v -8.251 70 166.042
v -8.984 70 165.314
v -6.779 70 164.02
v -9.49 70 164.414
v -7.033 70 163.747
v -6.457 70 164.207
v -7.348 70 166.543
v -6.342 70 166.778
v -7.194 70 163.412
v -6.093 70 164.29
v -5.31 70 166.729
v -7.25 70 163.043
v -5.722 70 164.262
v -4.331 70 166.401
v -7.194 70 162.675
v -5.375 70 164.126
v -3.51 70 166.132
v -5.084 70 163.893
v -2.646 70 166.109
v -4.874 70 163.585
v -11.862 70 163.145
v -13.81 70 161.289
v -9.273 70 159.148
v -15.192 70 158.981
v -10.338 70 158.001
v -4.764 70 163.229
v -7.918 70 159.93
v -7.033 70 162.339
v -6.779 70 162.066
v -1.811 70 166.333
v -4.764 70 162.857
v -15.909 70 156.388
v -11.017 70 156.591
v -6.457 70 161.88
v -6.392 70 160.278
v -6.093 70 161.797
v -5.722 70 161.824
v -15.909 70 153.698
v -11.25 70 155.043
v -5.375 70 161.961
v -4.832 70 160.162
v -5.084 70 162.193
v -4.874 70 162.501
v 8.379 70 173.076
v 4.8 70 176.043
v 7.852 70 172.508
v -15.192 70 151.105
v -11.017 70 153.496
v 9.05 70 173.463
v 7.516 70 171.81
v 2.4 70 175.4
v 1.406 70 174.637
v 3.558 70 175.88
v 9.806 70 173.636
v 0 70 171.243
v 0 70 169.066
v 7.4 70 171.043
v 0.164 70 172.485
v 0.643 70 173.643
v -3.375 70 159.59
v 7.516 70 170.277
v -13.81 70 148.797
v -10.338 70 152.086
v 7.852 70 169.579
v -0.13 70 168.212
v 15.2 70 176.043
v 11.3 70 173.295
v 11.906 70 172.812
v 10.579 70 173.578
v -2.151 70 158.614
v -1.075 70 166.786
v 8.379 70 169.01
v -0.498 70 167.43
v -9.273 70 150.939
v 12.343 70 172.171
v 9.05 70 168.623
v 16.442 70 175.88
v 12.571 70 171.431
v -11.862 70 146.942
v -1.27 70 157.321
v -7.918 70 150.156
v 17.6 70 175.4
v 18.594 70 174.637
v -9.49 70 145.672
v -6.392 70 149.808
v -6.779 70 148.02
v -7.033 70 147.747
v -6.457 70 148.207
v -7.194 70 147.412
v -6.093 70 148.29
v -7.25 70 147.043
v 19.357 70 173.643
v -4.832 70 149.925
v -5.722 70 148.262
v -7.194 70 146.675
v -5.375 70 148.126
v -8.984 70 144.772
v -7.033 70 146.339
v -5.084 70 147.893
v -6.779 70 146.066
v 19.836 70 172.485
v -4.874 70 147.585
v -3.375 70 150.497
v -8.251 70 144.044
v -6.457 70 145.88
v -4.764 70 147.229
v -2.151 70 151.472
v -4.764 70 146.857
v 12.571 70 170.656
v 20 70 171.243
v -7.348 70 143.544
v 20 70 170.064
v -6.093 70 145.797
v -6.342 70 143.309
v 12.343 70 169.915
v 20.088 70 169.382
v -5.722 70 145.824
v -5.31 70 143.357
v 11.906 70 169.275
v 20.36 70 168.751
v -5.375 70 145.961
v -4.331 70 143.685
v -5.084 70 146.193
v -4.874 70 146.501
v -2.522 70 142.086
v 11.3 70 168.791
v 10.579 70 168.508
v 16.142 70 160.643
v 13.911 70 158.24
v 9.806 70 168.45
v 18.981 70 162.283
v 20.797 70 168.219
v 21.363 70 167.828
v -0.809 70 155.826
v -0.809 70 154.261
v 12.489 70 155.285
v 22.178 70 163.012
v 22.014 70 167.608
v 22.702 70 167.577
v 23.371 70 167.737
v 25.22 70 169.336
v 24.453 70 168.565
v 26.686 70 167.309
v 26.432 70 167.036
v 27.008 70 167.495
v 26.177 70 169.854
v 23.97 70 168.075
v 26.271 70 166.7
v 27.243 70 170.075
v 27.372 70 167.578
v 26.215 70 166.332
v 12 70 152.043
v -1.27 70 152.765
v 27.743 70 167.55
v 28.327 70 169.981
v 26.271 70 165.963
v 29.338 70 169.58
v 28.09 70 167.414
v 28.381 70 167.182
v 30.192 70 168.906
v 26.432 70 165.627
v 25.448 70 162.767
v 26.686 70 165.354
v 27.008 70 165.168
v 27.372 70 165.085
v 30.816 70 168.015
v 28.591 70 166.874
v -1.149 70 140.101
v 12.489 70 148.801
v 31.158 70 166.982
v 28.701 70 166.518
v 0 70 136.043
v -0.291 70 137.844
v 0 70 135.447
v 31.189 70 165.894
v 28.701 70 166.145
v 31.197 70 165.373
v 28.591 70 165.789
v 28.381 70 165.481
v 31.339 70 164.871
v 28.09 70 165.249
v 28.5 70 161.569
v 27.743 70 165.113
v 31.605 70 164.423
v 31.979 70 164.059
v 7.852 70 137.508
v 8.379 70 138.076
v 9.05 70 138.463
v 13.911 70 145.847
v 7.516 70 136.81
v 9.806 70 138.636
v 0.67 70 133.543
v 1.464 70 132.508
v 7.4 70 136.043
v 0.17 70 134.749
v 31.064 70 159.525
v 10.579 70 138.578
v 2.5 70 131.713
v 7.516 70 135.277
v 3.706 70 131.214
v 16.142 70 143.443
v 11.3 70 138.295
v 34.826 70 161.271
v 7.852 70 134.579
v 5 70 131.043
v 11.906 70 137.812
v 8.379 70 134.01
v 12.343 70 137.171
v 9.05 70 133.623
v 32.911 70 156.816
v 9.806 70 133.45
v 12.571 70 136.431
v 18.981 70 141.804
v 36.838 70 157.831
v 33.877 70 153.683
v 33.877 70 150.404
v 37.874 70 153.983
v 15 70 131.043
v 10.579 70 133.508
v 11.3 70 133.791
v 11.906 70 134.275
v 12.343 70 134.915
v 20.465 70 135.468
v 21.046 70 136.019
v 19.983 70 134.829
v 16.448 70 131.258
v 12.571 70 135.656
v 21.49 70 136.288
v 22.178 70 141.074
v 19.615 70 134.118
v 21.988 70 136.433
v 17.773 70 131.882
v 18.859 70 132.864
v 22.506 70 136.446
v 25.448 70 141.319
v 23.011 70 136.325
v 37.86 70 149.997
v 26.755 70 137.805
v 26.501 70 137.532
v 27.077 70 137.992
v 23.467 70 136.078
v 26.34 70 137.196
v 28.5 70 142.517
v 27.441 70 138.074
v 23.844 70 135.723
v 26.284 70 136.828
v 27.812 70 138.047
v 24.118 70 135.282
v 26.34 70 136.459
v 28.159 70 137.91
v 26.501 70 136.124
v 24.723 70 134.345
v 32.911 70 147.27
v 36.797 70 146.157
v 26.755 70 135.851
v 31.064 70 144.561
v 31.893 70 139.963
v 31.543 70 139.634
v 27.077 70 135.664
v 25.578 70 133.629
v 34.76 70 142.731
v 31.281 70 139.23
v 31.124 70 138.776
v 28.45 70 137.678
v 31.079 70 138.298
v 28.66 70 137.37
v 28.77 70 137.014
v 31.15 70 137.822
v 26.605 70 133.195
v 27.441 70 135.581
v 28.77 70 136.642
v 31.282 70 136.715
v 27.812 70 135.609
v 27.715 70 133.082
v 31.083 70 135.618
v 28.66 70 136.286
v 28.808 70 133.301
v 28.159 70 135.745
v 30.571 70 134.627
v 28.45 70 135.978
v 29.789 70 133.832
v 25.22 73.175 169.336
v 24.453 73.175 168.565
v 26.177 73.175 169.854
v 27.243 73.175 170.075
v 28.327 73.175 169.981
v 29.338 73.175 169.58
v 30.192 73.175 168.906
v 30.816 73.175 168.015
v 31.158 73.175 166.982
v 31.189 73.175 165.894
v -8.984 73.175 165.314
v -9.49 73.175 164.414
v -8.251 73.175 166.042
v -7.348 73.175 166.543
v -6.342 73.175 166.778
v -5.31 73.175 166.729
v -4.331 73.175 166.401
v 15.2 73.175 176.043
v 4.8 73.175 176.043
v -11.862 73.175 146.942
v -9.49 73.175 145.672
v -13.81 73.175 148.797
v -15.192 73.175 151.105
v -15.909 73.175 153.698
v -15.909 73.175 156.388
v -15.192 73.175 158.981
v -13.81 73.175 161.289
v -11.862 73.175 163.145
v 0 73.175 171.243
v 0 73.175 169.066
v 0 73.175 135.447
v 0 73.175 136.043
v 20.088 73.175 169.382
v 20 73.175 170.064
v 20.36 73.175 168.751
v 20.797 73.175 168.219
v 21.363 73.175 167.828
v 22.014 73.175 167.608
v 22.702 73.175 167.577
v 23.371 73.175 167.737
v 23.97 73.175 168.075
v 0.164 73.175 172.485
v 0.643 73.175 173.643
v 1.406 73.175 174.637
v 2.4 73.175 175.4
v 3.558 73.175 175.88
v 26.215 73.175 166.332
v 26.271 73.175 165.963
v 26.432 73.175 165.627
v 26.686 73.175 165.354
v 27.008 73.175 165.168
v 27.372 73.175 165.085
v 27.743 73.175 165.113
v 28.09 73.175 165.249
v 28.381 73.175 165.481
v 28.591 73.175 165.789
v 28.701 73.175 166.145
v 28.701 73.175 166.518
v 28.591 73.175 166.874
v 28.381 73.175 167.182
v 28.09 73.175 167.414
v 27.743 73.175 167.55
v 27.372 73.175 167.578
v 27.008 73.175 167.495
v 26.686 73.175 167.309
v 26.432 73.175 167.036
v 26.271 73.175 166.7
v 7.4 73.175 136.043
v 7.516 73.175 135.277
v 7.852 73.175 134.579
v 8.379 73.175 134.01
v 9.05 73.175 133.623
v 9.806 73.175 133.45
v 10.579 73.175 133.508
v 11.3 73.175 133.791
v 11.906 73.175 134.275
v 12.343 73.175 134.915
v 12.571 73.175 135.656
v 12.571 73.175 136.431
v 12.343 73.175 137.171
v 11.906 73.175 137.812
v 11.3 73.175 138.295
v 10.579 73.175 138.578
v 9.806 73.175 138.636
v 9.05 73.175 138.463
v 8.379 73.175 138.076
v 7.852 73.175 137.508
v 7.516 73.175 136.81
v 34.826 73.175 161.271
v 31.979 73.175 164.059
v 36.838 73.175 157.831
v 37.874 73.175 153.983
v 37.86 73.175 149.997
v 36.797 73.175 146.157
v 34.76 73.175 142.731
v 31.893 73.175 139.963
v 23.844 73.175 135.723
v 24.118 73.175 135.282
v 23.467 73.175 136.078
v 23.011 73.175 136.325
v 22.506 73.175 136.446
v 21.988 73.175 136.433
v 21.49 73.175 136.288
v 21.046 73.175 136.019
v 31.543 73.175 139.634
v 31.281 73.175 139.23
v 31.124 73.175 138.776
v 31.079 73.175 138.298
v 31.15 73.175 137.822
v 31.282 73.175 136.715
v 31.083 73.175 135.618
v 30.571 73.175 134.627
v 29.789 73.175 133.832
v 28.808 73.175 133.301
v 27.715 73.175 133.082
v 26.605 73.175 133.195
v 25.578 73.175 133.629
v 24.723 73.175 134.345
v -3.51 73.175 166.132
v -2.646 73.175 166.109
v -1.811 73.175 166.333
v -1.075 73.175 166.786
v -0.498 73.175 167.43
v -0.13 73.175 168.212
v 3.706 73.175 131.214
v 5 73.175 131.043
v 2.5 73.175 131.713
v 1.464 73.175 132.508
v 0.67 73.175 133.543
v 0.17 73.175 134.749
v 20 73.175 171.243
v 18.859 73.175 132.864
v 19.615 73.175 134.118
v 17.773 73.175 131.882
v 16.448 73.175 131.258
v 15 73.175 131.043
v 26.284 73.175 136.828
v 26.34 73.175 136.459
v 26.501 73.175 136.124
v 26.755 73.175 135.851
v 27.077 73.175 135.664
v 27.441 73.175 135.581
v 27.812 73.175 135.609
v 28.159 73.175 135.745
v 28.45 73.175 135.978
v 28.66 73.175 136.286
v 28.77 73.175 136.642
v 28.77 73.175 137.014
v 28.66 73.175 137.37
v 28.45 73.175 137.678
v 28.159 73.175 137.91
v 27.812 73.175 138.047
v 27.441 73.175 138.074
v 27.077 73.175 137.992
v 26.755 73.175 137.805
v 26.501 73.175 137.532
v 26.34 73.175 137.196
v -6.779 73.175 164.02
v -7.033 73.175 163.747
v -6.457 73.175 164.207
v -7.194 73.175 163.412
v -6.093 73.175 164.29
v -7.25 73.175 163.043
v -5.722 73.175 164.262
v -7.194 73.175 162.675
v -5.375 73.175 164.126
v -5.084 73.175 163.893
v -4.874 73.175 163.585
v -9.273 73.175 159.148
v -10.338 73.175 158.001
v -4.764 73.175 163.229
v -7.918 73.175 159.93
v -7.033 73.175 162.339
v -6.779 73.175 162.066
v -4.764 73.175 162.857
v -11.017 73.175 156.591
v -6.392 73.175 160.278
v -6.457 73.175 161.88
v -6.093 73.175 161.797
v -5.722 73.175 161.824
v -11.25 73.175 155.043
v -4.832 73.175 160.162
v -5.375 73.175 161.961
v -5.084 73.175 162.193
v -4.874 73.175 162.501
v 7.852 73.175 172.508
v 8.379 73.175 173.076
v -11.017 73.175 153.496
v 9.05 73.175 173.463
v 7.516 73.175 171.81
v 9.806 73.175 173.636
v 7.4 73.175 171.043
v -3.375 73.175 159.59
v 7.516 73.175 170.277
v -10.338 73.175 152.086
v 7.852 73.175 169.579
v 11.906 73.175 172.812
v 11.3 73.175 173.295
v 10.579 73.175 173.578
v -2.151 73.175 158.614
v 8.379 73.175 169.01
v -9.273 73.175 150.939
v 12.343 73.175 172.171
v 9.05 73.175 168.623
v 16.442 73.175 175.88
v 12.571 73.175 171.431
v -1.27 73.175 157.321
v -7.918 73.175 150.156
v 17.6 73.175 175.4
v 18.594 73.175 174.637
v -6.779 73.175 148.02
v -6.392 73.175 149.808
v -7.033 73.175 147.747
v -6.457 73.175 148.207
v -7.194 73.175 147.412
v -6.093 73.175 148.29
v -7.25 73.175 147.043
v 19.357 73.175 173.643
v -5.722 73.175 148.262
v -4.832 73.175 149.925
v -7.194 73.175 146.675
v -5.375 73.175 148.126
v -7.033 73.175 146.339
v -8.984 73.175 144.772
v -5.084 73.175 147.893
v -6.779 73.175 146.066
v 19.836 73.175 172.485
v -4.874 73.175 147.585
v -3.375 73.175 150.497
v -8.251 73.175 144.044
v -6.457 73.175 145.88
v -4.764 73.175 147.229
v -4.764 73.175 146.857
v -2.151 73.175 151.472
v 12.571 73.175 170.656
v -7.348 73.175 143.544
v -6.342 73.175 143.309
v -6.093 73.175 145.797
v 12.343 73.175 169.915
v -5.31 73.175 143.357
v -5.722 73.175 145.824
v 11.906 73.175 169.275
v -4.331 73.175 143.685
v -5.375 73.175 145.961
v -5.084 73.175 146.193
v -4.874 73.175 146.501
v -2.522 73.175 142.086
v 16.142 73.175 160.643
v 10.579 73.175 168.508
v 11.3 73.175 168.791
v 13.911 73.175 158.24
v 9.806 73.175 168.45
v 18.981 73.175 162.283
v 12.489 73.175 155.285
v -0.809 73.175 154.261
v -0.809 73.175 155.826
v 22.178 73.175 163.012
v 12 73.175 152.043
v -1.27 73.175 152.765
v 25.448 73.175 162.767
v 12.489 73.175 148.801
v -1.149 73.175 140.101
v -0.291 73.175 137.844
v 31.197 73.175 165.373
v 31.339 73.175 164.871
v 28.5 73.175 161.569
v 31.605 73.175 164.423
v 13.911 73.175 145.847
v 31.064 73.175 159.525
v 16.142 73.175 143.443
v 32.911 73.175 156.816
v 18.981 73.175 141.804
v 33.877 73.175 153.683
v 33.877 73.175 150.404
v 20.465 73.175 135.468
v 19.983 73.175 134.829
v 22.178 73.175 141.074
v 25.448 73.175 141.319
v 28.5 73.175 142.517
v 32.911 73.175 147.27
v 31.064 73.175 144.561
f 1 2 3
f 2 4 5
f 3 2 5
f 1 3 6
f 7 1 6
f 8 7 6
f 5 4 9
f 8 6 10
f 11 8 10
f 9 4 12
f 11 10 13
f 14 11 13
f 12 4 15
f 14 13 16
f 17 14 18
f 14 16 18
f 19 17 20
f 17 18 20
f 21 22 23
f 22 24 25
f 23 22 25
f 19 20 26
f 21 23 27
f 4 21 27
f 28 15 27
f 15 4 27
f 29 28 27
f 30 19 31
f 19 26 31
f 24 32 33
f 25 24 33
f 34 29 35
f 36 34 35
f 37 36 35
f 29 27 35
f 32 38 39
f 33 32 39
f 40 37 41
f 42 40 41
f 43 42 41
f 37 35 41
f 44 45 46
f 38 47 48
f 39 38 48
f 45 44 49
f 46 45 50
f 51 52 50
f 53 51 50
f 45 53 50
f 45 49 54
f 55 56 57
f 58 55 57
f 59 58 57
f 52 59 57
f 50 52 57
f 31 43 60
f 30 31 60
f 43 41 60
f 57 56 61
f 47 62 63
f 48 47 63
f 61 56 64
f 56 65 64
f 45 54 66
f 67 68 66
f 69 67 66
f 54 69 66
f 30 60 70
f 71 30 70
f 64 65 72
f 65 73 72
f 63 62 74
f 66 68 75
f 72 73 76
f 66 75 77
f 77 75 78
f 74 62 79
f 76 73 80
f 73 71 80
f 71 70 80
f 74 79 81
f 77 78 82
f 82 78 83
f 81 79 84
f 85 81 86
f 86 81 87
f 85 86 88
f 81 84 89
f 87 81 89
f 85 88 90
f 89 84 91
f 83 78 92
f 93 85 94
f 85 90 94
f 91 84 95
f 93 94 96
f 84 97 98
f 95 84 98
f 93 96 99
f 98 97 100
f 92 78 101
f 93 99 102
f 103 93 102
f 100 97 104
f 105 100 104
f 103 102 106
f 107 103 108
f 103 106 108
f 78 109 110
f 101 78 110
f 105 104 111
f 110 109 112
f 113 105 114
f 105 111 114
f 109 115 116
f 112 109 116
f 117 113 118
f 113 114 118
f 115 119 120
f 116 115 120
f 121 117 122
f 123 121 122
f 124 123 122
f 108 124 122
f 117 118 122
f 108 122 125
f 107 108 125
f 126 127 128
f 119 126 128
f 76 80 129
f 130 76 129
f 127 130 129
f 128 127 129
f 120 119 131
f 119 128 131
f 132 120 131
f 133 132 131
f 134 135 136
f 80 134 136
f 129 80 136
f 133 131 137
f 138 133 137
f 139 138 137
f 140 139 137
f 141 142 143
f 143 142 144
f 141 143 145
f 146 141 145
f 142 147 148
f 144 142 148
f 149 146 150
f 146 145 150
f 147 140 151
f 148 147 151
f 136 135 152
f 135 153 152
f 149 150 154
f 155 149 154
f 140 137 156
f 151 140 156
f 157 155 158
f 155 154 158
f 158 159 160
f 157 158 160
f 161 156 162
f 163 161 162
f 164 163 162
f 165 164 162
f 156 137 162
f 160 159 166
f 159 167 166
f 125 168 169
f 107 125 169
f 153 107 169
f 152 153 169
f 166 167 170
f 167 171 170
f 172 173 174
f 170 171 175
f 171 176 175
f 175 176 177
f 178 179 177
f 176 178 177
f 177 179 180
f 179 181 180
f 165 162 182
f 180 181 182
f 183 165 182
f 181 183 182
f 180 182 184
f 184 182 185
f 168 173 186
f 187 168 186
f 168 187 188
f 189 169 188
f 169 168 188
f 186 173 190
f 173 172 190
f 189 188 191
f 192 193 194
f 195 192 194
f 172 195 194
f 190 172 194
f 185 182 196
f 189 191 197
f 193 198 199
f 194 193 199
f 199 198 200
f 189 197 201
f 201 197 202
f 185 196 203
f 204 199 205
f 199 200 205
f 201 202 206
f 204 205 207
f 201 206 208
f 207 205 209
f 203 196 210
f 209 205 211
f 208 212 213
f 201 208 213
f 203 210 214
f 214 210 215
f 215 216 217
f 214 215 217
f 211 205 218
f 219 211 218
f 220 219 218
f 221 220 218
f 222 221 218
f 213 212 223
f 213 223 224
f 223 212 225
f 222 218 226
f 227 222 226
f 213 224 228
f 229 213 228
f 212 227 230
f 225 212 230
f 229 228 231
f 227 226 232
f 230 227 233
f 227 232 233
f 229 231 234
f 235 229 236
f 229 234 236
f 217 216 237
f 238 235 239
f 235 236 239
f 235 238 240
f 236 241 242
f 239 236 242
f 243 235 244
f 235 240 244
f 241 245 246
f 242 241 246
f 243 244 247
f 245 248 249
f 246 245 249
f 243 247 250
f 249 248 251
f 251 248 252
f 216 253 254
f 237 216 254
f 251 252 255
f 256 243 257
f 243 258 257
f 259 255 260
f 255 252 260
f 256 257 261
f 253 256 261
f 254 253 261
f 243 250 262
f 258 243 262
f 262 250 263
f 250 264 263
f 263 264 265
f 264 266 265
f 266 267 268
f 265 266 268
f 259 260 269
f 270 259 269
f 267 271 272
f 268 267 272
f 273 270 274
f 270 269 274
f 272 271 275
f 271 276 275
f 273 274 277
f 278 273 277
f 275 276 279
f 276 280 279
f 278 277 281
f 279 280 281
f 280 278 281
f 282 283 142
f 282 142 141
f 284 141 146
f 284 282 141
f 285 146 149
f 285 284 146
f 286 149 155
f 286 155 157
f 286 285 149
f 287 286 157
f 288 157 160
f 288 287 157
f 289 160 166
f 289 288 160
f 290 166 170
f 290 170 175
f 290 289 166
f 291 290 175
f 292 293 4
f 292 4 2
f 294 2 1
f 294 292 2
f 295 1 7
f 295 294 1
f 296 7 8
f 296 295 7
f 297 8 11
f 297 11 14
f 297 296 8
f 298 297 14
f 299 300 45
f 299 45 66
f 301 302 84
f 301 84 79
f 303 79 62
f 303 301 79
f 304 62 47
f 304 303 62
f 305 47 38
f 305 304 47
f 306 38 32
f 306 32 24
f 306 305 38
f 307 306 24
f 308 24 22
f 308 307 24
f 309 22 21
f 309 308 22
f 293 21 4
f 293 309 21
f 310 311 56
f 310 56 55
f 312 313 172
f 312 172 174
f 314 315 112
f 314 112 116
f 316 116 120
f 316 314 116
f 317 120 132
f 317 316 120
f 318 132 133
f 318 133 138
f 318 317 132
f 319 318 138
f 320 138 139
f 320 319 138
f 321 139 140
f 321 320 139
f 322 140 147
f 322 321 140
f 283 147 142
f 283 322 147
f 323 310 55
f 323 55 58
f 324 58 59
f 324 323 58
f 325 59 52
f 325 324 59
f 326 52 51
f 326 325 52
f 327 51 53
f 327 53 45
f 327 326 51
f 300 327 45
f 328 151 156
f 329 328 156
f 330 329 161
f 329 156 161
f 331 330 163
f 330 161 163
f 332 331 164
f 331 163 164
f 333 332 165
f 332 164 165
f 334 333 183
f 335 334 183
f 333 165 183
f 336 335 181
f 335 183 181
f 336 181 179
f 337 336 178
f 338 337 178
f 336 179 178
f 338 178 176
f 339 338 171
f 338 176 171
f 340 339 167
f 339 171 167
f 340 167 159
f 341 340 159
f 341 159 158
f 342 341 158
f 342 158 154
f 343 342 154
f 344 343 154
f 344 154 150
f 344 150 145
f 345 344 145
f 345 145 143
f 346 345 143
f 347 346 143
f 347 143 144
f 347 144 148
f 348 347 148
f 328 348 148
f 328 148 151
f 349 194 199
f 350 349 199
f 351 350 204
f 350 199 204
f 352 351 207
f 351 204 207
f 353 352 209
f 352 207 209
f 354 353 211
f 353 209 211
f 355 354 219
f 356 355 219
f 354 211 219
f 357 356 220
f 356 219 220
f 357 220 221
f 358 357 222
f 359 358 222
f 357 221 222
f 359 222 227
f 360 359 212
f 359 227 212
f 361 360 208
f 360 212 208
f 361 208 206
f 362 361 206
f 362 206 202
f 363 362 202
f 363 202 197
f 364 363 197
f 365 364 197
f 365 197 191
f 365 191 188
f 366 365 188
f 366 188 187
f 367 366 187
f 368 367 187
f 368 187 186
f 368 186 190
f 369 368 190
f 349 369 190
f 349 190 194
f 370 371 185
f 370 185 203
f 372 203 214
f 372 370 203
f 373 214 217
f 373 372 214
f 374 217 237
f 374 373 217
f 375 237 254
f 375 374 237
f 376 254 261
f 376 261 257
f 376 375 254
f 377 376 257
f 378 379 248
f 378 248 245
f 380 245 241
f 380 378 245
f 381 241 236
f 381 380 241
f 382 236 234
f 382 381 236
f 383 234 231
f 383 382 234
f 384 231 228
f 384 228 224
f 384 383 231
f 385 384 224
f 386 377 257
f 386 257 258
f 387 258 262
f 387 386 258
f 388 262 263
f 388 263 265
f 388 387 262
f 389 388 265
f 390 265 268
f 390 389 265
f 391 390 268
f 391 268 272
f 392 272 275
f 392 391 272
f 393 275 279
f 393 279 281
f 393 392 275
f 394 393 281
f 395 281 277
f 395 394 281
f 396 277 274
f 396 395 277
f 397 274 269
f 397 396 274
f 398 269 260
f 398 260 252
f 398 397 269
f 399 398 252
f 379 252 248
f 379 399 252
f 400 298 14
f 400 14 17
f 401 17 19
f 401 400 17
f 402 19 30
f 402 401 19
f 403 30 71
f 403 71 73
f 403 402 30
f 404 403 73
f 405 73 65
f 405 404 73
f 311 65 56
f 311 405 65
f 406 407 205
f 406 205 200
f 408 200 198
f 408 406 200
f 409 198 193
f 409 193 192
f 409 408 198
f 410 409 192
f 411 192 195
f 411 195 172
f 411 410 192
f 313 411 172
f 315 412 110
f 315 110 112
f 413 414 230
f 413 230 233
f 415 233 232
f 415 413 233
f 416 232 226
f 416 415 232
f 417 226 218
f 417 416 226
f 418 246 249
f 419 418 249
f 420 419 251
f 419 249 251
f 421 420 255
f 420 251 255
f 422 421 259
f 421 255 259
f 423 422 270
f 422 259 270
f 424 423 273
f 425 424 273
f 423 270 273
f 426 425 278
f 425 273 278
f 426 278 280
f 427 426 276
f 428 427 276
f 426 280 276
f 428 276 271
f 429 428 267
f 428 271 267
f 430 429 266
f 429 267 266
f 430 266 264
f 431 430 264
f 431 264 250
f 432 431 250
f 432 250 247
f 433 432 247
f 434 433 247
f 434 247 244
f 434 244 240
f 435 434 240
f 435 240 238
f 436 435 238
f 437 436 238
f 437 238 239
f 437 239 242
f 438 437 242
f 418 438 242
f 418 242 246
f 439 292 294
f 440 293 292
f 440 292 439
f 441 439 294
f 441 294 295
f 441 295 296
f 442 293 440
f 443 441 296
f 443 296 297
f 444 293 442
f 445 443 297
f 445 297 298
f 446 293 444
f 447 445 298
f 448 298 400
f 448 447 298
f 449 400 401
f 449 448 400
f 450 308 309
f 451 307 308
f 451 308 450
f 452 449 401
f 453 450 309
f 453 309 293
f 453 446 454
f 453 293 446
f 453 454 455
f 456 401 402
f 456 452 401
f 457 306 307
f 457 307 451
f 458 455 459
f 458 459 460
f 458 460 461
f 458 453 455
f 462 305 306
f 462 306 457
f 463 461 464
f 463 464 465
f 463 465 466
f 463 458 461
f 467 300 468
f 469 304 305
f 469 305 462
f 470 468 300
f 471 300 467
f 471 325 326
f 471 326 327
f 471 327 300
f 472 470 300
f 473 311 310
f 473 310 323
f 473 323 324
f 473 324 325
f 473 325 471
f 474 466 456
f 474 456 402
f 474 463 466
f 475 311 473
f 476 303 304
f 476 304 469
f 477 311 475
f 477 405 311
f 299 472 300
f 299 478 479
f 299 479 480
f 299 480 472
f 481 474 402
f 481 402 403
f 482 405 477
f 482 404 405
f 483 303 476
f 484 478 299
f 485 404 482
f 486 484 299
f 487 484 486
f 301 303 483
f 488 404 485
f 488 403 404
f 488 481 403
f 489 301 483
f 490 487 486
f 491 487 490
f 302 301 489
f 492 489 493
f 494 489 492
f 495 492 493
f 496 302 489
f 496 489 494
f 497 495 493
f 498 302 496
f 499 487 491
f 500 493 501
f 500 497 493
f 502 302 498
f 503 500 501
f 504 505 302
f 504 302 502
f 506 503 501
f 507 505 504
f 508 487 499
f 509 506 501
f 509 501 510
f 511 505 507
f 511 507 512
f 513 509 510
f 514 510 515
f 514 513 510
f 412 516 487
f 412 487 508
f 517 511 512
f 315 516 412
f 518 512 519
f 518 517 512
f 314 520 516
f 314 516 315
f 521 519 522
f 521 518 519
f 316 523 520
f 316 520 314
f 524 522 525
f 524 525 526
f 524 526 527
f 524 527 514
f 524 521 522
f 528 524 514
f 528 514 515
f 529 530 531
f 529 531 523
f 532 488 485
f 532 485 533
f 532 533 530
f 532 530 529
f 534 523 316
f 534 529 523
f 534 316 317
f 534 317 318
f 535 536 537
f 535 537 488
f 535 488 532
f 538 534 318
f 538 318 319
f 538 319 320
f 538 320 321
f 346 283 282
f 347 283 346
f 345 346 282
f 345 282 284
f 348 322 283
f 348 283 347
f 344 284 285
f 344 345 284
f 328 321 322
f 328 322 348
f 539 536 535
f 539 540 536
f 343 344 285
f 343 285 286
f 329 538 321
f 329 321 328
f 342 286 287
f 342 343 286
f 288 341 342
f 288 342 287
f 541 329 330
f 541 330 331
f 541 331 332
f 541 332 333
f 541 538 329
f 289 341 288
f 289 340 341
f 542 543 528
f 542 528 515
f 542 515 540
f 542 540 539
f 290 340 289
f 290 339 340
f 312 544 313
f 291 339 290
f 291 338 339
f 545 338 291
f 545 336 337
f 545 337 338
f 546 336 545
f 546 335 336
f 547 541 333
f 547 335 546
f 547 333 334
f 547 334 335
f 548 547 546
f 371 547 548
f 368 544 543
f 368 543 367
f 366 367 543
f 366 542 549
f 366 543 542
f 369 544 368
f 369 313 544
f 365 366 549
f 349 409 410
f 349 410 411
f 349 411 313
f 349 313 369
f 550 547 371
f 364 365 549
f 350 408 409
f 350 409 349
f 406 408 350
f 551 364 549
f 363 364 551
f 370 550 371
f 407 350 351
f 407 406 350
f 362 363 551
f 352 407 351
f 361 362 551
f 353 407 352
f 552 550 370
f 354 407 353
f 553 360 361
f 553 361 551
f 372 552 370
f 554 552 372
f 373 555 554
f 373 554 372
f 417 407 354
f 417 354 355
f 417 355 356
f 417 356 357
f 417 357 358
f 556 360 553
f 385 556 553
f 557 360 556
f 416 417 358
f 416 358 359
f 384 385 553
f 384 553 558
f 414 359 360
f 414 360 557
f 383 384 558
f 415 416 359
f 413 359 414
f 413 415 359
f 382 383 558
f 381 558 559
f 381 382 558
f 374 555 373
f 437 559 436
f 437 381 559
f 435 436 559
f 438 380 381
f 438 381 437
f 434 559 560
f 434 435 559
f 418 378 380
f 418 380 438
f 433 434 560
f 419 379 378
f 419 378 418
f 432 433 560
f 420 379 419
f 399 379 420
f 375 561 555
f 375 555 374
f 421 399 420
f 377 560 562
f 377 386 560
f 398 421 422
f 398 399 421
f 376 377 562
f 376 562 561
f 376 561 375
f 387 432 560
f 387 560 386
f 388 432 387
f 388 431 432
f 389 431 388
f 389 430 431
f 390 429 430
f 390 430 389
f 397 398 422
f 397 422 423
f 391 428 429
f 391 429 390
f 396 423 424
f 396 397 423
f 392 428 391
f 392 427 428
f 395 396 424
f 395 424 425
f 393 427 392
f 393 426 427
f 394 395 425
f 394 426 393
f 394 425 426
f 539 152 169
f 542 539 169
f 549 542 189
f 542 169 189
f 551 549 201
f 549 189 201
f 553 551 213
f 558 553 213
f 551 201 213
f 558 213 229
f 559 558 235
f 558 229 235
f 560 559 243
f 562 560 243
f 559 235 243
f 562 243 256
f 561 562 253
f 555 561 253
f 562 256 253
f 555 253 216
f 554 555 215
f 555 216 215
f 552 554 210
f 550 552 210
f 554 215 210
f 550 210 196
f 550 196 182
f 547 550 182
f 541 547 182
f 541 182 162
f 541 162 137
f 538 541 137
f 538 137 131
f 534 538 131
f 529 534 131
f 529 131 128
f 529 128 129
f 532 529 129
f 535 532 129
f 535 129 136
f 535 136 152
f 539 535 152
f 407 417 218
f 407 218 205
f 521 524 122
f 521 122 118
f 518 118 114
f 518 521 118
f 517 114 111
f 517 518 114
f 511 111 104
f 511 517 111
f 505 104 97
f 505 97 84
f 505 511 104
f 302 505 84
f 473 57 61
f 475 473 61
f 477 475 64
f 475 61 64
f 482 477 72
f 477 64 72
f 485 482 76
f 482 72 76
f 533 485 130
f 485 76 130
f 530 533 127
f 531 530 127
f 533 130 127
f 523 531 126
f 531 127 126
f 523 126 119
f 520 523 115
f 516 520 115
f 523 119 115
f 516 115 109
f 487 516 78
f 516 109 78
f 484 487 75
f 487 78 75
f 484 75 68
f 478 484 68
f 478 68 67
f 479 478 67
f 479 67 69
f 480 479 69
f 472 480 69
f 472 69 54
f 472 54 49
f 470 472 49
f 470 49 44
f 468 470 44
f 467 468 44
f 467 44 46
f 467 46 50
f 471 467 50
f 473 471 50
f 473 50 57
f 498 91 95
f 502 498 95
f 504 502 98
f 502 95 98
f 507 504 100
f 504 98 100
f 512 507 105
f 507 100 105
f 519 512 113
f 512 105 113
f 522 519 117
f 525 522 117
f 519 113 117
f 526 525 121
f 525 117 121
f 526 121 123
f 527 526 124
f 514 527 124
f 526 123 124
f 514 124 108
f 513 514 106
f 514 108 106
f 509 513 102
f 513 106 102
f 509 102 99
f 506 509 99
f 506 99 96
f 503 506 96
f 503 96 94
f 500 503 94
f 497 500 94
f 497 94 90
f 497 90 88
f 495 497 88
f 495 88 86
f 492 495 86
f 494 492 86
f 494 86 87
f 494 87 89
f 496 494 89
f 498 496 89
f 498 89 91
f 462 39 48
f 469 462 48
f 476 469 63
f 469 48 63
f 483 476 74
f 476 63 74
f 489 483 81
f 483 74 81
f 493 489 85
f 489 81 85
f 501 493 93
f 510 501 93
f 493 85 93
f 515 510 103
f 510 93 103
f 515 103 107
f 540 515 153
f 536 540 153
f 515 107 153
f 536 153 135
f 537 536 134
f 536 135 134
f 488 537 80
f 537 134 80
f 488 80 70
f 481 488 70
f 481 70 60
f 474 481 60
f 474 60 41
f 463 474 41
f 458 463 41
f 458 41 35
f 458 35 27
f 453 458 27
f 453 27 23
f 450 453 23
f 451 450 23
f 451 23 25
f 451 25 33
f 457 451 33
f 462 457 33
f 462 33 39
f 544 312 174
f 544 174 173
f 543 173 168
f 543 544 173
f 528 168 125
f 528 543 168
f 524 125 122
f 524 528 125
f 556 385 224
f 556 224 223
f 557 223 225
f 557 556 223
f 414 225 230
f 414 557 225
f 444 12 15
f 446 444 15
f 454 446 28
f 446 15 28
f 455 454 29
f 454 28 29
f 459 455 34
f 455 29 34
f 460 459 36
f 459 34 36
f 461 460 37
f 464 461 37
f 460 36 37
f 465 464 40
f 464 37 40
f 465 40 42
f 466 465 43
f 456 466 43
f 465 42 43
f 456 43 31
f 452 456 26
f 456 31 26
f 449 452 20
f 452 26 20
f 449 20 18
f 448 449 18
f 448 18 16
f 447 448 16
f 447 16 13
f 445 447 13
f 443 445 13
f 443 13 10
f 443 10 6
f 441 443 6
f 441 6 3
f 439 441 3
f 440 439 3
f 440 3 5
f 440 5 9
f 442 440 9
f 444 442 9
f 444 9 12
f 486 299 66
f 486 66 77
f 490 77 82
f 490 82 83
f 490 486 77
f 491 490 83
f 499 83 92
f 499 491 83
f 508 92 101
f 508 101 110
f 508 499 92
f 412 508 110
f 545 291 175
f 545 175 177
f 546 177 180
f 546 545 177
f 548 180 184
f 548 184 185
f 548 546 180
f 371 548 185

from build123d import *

# Parameters (mm, degrees)
BOSS_EXTRUDE1_DEPTH          = 3.175
CUT_EXTRUDE1_START           = -3.175
CUT_EXTRUDE1_DEPTH           = 3.175
F_2_5_2_5_DIAMETER_HOLE1_D   = 2.5
F_22_0_22_DIAMETER_HOLE1_D   = 22
F_10_5_10_5_DIAMETER_HOLE1_D = 10.5
F_5_2_5_2_DIAMETER_HOLE1_D   = 5.2


with BuildPart() as part:
    # Sketch1 → Boss-Extrude1 (new body)
    with BuildSketch(Plane(origin=(0, 73.175, 0), x_dir=(1, 0, 0), z_dir=(0, 1, 0))):
        with BuildLine():
            Line((15, -131.043137062), (-1.022023545, -131.043137062))
            ThreePointArc((-1.022023545, -131.043137062), (-0.325892642, -137.979342107), (-4.330946321, -143.685048347))
            ThreePointArc((-4.330946321, -143.685048347), (-7.347711019, -143.543683532), (-9.490358424, -145.672043312))
            ThreePointArc((-9.490358424, -145.672043312), (-16, -155.043137062), (-9.490358424, -164.414230812))
            ThreePointArc((-9.490358424, -164.414230812), (-7.347711019, -166.542590592), (-4.330946321, -166.401225777))
            ThreePointArc((-4.330946321, -166.401225777), (-1.426295687, -166.532567239), (0, -169.066324625))
            Line((0, -169.066324625), (0, -171.243137062))
            ThreePointArc((0, -171.243137062), (1.40588745, -174.637249612), (4.8, -176.043137062))
            Line((4.8, -176.043137062), (15.2, -176.043137062))
            ThreePointArc((15.2, -176.043137062), (18.59411255, -174.637249612), (20, -171.243137062))
            Line((20, -171.243137062), (20, -170.064478312))
            ThreePointArc((20, -170.064478312), (21.68082981, -167.69523564), (24.452536205, -168.564800671))
            ThreePointArc((24.452536205, -168.564800671), (28.846907451, -169.817736591), (31.189498771, -165.894394524))
            ThreePointArc((31.189498771, -165.894394524), (31.338525975, -164.871140606), (31.978698654, -164.05908357))
            ThreePointArc((31.978698654, -164.05908357), (37.999904187, -151.989523925), (31.892574785, -139.963314477))
            ThreePointArc((31.892574785, -139.963314477), (31.188720102, -139.008164704), (31.149849359, -137.822326786))
            ThreePointArc((31.149849359, -137.822326786), (28.808294112, -133.301045501), (24.117695109, -135.281738919))
            ThreePointArc((24.117695109, -135.281738919), (22.762301061, -136.401892346), (21.046177665, -136.018803304))
            ThreePointArc((21.046177665, -136.018803304), (20.21083435, -135.158715929), (19.614707675, -134.118436286))
            ThreePointArc((19.614707675, -134.118436286), (17.772769024, -131.882397712), (15, -131.043137062))
        make_face()
    extrude(amount=-BOSS_EXTRUDE1_DEPTH)

    # Sketch2 → Cut-Extrude1 (cut)
    with BuildSketch(Plane.XZ.offset(-70).offset(CUT_EXTRUDE1_START)):
        with BuildLine():
            Line((0, 136.043137062), (0, 135.44721912))
            ThreePointArc((0, 135.44721912), (-0.258856213, 133.18666217), (-1.022023545, 131.043137062))
            Line((-1.022023545, 131.043137062), (5, 131.043137062))
            ThreePointArc((5, 131.043137062), (1.464466094, 132.507603156), (0, 136.043137062))
        make_face()
    extrude(amount=CUT_EXTRUDE1_DEPTH, mode=Mode.SUBTRACT)

    # Ø2.5 (2.5) Diameter Hole1 (through all)
    with Locations(Plane(origin=(0, 73.175, 0), x_dir=(1, 0, 0), z_dir=(0, 1, 0))):
        with Locations((27.534095489, -136.827930511), (27.465074328, -166.331615936), (-6, -147.043137062), (-6, -163.043137062)):
            Hole(F_2_5_2_5_DIAMETER_HOLE1_D / 2)

    # Ø22.0 (22) Diameter Hole1 (through all)
    with Locations(Plane(origin=(0, 73.175, 0), x_dir=(1, 0, 0), z_dir=(0, 1, 0))):
        with Locations((23, -152.043137062)):
            Hole(F_22_0_22_DIAMETER_HOLE1_D / 2)

    # Ø10.5 (10.5) Diameter Hole1 (through all)
    with Locations(Plane(origin=(0, 73.175, 0), x_dir=(1, 0, 0), z_dir=(0, 1, 0))):
        with Locations((-6, -155.043137062)):
            Hole(F_10_5_10_5_DIAMETER_HOLE1_D / 2)

    # Ø5.2 (5.2) Diameter Hole1 (through all)
    with Locations(Plane(origin=(0, 73.175, 0), x_dir=(1, 0, 0), z_dir=(0, 1, 0))):
        with Locations((10, -171.043137062), (10, -136.043137062)):
            Hole(F_5_2_5_2_DIAMETER_HOLE1_D / 2)


solid = part.part
